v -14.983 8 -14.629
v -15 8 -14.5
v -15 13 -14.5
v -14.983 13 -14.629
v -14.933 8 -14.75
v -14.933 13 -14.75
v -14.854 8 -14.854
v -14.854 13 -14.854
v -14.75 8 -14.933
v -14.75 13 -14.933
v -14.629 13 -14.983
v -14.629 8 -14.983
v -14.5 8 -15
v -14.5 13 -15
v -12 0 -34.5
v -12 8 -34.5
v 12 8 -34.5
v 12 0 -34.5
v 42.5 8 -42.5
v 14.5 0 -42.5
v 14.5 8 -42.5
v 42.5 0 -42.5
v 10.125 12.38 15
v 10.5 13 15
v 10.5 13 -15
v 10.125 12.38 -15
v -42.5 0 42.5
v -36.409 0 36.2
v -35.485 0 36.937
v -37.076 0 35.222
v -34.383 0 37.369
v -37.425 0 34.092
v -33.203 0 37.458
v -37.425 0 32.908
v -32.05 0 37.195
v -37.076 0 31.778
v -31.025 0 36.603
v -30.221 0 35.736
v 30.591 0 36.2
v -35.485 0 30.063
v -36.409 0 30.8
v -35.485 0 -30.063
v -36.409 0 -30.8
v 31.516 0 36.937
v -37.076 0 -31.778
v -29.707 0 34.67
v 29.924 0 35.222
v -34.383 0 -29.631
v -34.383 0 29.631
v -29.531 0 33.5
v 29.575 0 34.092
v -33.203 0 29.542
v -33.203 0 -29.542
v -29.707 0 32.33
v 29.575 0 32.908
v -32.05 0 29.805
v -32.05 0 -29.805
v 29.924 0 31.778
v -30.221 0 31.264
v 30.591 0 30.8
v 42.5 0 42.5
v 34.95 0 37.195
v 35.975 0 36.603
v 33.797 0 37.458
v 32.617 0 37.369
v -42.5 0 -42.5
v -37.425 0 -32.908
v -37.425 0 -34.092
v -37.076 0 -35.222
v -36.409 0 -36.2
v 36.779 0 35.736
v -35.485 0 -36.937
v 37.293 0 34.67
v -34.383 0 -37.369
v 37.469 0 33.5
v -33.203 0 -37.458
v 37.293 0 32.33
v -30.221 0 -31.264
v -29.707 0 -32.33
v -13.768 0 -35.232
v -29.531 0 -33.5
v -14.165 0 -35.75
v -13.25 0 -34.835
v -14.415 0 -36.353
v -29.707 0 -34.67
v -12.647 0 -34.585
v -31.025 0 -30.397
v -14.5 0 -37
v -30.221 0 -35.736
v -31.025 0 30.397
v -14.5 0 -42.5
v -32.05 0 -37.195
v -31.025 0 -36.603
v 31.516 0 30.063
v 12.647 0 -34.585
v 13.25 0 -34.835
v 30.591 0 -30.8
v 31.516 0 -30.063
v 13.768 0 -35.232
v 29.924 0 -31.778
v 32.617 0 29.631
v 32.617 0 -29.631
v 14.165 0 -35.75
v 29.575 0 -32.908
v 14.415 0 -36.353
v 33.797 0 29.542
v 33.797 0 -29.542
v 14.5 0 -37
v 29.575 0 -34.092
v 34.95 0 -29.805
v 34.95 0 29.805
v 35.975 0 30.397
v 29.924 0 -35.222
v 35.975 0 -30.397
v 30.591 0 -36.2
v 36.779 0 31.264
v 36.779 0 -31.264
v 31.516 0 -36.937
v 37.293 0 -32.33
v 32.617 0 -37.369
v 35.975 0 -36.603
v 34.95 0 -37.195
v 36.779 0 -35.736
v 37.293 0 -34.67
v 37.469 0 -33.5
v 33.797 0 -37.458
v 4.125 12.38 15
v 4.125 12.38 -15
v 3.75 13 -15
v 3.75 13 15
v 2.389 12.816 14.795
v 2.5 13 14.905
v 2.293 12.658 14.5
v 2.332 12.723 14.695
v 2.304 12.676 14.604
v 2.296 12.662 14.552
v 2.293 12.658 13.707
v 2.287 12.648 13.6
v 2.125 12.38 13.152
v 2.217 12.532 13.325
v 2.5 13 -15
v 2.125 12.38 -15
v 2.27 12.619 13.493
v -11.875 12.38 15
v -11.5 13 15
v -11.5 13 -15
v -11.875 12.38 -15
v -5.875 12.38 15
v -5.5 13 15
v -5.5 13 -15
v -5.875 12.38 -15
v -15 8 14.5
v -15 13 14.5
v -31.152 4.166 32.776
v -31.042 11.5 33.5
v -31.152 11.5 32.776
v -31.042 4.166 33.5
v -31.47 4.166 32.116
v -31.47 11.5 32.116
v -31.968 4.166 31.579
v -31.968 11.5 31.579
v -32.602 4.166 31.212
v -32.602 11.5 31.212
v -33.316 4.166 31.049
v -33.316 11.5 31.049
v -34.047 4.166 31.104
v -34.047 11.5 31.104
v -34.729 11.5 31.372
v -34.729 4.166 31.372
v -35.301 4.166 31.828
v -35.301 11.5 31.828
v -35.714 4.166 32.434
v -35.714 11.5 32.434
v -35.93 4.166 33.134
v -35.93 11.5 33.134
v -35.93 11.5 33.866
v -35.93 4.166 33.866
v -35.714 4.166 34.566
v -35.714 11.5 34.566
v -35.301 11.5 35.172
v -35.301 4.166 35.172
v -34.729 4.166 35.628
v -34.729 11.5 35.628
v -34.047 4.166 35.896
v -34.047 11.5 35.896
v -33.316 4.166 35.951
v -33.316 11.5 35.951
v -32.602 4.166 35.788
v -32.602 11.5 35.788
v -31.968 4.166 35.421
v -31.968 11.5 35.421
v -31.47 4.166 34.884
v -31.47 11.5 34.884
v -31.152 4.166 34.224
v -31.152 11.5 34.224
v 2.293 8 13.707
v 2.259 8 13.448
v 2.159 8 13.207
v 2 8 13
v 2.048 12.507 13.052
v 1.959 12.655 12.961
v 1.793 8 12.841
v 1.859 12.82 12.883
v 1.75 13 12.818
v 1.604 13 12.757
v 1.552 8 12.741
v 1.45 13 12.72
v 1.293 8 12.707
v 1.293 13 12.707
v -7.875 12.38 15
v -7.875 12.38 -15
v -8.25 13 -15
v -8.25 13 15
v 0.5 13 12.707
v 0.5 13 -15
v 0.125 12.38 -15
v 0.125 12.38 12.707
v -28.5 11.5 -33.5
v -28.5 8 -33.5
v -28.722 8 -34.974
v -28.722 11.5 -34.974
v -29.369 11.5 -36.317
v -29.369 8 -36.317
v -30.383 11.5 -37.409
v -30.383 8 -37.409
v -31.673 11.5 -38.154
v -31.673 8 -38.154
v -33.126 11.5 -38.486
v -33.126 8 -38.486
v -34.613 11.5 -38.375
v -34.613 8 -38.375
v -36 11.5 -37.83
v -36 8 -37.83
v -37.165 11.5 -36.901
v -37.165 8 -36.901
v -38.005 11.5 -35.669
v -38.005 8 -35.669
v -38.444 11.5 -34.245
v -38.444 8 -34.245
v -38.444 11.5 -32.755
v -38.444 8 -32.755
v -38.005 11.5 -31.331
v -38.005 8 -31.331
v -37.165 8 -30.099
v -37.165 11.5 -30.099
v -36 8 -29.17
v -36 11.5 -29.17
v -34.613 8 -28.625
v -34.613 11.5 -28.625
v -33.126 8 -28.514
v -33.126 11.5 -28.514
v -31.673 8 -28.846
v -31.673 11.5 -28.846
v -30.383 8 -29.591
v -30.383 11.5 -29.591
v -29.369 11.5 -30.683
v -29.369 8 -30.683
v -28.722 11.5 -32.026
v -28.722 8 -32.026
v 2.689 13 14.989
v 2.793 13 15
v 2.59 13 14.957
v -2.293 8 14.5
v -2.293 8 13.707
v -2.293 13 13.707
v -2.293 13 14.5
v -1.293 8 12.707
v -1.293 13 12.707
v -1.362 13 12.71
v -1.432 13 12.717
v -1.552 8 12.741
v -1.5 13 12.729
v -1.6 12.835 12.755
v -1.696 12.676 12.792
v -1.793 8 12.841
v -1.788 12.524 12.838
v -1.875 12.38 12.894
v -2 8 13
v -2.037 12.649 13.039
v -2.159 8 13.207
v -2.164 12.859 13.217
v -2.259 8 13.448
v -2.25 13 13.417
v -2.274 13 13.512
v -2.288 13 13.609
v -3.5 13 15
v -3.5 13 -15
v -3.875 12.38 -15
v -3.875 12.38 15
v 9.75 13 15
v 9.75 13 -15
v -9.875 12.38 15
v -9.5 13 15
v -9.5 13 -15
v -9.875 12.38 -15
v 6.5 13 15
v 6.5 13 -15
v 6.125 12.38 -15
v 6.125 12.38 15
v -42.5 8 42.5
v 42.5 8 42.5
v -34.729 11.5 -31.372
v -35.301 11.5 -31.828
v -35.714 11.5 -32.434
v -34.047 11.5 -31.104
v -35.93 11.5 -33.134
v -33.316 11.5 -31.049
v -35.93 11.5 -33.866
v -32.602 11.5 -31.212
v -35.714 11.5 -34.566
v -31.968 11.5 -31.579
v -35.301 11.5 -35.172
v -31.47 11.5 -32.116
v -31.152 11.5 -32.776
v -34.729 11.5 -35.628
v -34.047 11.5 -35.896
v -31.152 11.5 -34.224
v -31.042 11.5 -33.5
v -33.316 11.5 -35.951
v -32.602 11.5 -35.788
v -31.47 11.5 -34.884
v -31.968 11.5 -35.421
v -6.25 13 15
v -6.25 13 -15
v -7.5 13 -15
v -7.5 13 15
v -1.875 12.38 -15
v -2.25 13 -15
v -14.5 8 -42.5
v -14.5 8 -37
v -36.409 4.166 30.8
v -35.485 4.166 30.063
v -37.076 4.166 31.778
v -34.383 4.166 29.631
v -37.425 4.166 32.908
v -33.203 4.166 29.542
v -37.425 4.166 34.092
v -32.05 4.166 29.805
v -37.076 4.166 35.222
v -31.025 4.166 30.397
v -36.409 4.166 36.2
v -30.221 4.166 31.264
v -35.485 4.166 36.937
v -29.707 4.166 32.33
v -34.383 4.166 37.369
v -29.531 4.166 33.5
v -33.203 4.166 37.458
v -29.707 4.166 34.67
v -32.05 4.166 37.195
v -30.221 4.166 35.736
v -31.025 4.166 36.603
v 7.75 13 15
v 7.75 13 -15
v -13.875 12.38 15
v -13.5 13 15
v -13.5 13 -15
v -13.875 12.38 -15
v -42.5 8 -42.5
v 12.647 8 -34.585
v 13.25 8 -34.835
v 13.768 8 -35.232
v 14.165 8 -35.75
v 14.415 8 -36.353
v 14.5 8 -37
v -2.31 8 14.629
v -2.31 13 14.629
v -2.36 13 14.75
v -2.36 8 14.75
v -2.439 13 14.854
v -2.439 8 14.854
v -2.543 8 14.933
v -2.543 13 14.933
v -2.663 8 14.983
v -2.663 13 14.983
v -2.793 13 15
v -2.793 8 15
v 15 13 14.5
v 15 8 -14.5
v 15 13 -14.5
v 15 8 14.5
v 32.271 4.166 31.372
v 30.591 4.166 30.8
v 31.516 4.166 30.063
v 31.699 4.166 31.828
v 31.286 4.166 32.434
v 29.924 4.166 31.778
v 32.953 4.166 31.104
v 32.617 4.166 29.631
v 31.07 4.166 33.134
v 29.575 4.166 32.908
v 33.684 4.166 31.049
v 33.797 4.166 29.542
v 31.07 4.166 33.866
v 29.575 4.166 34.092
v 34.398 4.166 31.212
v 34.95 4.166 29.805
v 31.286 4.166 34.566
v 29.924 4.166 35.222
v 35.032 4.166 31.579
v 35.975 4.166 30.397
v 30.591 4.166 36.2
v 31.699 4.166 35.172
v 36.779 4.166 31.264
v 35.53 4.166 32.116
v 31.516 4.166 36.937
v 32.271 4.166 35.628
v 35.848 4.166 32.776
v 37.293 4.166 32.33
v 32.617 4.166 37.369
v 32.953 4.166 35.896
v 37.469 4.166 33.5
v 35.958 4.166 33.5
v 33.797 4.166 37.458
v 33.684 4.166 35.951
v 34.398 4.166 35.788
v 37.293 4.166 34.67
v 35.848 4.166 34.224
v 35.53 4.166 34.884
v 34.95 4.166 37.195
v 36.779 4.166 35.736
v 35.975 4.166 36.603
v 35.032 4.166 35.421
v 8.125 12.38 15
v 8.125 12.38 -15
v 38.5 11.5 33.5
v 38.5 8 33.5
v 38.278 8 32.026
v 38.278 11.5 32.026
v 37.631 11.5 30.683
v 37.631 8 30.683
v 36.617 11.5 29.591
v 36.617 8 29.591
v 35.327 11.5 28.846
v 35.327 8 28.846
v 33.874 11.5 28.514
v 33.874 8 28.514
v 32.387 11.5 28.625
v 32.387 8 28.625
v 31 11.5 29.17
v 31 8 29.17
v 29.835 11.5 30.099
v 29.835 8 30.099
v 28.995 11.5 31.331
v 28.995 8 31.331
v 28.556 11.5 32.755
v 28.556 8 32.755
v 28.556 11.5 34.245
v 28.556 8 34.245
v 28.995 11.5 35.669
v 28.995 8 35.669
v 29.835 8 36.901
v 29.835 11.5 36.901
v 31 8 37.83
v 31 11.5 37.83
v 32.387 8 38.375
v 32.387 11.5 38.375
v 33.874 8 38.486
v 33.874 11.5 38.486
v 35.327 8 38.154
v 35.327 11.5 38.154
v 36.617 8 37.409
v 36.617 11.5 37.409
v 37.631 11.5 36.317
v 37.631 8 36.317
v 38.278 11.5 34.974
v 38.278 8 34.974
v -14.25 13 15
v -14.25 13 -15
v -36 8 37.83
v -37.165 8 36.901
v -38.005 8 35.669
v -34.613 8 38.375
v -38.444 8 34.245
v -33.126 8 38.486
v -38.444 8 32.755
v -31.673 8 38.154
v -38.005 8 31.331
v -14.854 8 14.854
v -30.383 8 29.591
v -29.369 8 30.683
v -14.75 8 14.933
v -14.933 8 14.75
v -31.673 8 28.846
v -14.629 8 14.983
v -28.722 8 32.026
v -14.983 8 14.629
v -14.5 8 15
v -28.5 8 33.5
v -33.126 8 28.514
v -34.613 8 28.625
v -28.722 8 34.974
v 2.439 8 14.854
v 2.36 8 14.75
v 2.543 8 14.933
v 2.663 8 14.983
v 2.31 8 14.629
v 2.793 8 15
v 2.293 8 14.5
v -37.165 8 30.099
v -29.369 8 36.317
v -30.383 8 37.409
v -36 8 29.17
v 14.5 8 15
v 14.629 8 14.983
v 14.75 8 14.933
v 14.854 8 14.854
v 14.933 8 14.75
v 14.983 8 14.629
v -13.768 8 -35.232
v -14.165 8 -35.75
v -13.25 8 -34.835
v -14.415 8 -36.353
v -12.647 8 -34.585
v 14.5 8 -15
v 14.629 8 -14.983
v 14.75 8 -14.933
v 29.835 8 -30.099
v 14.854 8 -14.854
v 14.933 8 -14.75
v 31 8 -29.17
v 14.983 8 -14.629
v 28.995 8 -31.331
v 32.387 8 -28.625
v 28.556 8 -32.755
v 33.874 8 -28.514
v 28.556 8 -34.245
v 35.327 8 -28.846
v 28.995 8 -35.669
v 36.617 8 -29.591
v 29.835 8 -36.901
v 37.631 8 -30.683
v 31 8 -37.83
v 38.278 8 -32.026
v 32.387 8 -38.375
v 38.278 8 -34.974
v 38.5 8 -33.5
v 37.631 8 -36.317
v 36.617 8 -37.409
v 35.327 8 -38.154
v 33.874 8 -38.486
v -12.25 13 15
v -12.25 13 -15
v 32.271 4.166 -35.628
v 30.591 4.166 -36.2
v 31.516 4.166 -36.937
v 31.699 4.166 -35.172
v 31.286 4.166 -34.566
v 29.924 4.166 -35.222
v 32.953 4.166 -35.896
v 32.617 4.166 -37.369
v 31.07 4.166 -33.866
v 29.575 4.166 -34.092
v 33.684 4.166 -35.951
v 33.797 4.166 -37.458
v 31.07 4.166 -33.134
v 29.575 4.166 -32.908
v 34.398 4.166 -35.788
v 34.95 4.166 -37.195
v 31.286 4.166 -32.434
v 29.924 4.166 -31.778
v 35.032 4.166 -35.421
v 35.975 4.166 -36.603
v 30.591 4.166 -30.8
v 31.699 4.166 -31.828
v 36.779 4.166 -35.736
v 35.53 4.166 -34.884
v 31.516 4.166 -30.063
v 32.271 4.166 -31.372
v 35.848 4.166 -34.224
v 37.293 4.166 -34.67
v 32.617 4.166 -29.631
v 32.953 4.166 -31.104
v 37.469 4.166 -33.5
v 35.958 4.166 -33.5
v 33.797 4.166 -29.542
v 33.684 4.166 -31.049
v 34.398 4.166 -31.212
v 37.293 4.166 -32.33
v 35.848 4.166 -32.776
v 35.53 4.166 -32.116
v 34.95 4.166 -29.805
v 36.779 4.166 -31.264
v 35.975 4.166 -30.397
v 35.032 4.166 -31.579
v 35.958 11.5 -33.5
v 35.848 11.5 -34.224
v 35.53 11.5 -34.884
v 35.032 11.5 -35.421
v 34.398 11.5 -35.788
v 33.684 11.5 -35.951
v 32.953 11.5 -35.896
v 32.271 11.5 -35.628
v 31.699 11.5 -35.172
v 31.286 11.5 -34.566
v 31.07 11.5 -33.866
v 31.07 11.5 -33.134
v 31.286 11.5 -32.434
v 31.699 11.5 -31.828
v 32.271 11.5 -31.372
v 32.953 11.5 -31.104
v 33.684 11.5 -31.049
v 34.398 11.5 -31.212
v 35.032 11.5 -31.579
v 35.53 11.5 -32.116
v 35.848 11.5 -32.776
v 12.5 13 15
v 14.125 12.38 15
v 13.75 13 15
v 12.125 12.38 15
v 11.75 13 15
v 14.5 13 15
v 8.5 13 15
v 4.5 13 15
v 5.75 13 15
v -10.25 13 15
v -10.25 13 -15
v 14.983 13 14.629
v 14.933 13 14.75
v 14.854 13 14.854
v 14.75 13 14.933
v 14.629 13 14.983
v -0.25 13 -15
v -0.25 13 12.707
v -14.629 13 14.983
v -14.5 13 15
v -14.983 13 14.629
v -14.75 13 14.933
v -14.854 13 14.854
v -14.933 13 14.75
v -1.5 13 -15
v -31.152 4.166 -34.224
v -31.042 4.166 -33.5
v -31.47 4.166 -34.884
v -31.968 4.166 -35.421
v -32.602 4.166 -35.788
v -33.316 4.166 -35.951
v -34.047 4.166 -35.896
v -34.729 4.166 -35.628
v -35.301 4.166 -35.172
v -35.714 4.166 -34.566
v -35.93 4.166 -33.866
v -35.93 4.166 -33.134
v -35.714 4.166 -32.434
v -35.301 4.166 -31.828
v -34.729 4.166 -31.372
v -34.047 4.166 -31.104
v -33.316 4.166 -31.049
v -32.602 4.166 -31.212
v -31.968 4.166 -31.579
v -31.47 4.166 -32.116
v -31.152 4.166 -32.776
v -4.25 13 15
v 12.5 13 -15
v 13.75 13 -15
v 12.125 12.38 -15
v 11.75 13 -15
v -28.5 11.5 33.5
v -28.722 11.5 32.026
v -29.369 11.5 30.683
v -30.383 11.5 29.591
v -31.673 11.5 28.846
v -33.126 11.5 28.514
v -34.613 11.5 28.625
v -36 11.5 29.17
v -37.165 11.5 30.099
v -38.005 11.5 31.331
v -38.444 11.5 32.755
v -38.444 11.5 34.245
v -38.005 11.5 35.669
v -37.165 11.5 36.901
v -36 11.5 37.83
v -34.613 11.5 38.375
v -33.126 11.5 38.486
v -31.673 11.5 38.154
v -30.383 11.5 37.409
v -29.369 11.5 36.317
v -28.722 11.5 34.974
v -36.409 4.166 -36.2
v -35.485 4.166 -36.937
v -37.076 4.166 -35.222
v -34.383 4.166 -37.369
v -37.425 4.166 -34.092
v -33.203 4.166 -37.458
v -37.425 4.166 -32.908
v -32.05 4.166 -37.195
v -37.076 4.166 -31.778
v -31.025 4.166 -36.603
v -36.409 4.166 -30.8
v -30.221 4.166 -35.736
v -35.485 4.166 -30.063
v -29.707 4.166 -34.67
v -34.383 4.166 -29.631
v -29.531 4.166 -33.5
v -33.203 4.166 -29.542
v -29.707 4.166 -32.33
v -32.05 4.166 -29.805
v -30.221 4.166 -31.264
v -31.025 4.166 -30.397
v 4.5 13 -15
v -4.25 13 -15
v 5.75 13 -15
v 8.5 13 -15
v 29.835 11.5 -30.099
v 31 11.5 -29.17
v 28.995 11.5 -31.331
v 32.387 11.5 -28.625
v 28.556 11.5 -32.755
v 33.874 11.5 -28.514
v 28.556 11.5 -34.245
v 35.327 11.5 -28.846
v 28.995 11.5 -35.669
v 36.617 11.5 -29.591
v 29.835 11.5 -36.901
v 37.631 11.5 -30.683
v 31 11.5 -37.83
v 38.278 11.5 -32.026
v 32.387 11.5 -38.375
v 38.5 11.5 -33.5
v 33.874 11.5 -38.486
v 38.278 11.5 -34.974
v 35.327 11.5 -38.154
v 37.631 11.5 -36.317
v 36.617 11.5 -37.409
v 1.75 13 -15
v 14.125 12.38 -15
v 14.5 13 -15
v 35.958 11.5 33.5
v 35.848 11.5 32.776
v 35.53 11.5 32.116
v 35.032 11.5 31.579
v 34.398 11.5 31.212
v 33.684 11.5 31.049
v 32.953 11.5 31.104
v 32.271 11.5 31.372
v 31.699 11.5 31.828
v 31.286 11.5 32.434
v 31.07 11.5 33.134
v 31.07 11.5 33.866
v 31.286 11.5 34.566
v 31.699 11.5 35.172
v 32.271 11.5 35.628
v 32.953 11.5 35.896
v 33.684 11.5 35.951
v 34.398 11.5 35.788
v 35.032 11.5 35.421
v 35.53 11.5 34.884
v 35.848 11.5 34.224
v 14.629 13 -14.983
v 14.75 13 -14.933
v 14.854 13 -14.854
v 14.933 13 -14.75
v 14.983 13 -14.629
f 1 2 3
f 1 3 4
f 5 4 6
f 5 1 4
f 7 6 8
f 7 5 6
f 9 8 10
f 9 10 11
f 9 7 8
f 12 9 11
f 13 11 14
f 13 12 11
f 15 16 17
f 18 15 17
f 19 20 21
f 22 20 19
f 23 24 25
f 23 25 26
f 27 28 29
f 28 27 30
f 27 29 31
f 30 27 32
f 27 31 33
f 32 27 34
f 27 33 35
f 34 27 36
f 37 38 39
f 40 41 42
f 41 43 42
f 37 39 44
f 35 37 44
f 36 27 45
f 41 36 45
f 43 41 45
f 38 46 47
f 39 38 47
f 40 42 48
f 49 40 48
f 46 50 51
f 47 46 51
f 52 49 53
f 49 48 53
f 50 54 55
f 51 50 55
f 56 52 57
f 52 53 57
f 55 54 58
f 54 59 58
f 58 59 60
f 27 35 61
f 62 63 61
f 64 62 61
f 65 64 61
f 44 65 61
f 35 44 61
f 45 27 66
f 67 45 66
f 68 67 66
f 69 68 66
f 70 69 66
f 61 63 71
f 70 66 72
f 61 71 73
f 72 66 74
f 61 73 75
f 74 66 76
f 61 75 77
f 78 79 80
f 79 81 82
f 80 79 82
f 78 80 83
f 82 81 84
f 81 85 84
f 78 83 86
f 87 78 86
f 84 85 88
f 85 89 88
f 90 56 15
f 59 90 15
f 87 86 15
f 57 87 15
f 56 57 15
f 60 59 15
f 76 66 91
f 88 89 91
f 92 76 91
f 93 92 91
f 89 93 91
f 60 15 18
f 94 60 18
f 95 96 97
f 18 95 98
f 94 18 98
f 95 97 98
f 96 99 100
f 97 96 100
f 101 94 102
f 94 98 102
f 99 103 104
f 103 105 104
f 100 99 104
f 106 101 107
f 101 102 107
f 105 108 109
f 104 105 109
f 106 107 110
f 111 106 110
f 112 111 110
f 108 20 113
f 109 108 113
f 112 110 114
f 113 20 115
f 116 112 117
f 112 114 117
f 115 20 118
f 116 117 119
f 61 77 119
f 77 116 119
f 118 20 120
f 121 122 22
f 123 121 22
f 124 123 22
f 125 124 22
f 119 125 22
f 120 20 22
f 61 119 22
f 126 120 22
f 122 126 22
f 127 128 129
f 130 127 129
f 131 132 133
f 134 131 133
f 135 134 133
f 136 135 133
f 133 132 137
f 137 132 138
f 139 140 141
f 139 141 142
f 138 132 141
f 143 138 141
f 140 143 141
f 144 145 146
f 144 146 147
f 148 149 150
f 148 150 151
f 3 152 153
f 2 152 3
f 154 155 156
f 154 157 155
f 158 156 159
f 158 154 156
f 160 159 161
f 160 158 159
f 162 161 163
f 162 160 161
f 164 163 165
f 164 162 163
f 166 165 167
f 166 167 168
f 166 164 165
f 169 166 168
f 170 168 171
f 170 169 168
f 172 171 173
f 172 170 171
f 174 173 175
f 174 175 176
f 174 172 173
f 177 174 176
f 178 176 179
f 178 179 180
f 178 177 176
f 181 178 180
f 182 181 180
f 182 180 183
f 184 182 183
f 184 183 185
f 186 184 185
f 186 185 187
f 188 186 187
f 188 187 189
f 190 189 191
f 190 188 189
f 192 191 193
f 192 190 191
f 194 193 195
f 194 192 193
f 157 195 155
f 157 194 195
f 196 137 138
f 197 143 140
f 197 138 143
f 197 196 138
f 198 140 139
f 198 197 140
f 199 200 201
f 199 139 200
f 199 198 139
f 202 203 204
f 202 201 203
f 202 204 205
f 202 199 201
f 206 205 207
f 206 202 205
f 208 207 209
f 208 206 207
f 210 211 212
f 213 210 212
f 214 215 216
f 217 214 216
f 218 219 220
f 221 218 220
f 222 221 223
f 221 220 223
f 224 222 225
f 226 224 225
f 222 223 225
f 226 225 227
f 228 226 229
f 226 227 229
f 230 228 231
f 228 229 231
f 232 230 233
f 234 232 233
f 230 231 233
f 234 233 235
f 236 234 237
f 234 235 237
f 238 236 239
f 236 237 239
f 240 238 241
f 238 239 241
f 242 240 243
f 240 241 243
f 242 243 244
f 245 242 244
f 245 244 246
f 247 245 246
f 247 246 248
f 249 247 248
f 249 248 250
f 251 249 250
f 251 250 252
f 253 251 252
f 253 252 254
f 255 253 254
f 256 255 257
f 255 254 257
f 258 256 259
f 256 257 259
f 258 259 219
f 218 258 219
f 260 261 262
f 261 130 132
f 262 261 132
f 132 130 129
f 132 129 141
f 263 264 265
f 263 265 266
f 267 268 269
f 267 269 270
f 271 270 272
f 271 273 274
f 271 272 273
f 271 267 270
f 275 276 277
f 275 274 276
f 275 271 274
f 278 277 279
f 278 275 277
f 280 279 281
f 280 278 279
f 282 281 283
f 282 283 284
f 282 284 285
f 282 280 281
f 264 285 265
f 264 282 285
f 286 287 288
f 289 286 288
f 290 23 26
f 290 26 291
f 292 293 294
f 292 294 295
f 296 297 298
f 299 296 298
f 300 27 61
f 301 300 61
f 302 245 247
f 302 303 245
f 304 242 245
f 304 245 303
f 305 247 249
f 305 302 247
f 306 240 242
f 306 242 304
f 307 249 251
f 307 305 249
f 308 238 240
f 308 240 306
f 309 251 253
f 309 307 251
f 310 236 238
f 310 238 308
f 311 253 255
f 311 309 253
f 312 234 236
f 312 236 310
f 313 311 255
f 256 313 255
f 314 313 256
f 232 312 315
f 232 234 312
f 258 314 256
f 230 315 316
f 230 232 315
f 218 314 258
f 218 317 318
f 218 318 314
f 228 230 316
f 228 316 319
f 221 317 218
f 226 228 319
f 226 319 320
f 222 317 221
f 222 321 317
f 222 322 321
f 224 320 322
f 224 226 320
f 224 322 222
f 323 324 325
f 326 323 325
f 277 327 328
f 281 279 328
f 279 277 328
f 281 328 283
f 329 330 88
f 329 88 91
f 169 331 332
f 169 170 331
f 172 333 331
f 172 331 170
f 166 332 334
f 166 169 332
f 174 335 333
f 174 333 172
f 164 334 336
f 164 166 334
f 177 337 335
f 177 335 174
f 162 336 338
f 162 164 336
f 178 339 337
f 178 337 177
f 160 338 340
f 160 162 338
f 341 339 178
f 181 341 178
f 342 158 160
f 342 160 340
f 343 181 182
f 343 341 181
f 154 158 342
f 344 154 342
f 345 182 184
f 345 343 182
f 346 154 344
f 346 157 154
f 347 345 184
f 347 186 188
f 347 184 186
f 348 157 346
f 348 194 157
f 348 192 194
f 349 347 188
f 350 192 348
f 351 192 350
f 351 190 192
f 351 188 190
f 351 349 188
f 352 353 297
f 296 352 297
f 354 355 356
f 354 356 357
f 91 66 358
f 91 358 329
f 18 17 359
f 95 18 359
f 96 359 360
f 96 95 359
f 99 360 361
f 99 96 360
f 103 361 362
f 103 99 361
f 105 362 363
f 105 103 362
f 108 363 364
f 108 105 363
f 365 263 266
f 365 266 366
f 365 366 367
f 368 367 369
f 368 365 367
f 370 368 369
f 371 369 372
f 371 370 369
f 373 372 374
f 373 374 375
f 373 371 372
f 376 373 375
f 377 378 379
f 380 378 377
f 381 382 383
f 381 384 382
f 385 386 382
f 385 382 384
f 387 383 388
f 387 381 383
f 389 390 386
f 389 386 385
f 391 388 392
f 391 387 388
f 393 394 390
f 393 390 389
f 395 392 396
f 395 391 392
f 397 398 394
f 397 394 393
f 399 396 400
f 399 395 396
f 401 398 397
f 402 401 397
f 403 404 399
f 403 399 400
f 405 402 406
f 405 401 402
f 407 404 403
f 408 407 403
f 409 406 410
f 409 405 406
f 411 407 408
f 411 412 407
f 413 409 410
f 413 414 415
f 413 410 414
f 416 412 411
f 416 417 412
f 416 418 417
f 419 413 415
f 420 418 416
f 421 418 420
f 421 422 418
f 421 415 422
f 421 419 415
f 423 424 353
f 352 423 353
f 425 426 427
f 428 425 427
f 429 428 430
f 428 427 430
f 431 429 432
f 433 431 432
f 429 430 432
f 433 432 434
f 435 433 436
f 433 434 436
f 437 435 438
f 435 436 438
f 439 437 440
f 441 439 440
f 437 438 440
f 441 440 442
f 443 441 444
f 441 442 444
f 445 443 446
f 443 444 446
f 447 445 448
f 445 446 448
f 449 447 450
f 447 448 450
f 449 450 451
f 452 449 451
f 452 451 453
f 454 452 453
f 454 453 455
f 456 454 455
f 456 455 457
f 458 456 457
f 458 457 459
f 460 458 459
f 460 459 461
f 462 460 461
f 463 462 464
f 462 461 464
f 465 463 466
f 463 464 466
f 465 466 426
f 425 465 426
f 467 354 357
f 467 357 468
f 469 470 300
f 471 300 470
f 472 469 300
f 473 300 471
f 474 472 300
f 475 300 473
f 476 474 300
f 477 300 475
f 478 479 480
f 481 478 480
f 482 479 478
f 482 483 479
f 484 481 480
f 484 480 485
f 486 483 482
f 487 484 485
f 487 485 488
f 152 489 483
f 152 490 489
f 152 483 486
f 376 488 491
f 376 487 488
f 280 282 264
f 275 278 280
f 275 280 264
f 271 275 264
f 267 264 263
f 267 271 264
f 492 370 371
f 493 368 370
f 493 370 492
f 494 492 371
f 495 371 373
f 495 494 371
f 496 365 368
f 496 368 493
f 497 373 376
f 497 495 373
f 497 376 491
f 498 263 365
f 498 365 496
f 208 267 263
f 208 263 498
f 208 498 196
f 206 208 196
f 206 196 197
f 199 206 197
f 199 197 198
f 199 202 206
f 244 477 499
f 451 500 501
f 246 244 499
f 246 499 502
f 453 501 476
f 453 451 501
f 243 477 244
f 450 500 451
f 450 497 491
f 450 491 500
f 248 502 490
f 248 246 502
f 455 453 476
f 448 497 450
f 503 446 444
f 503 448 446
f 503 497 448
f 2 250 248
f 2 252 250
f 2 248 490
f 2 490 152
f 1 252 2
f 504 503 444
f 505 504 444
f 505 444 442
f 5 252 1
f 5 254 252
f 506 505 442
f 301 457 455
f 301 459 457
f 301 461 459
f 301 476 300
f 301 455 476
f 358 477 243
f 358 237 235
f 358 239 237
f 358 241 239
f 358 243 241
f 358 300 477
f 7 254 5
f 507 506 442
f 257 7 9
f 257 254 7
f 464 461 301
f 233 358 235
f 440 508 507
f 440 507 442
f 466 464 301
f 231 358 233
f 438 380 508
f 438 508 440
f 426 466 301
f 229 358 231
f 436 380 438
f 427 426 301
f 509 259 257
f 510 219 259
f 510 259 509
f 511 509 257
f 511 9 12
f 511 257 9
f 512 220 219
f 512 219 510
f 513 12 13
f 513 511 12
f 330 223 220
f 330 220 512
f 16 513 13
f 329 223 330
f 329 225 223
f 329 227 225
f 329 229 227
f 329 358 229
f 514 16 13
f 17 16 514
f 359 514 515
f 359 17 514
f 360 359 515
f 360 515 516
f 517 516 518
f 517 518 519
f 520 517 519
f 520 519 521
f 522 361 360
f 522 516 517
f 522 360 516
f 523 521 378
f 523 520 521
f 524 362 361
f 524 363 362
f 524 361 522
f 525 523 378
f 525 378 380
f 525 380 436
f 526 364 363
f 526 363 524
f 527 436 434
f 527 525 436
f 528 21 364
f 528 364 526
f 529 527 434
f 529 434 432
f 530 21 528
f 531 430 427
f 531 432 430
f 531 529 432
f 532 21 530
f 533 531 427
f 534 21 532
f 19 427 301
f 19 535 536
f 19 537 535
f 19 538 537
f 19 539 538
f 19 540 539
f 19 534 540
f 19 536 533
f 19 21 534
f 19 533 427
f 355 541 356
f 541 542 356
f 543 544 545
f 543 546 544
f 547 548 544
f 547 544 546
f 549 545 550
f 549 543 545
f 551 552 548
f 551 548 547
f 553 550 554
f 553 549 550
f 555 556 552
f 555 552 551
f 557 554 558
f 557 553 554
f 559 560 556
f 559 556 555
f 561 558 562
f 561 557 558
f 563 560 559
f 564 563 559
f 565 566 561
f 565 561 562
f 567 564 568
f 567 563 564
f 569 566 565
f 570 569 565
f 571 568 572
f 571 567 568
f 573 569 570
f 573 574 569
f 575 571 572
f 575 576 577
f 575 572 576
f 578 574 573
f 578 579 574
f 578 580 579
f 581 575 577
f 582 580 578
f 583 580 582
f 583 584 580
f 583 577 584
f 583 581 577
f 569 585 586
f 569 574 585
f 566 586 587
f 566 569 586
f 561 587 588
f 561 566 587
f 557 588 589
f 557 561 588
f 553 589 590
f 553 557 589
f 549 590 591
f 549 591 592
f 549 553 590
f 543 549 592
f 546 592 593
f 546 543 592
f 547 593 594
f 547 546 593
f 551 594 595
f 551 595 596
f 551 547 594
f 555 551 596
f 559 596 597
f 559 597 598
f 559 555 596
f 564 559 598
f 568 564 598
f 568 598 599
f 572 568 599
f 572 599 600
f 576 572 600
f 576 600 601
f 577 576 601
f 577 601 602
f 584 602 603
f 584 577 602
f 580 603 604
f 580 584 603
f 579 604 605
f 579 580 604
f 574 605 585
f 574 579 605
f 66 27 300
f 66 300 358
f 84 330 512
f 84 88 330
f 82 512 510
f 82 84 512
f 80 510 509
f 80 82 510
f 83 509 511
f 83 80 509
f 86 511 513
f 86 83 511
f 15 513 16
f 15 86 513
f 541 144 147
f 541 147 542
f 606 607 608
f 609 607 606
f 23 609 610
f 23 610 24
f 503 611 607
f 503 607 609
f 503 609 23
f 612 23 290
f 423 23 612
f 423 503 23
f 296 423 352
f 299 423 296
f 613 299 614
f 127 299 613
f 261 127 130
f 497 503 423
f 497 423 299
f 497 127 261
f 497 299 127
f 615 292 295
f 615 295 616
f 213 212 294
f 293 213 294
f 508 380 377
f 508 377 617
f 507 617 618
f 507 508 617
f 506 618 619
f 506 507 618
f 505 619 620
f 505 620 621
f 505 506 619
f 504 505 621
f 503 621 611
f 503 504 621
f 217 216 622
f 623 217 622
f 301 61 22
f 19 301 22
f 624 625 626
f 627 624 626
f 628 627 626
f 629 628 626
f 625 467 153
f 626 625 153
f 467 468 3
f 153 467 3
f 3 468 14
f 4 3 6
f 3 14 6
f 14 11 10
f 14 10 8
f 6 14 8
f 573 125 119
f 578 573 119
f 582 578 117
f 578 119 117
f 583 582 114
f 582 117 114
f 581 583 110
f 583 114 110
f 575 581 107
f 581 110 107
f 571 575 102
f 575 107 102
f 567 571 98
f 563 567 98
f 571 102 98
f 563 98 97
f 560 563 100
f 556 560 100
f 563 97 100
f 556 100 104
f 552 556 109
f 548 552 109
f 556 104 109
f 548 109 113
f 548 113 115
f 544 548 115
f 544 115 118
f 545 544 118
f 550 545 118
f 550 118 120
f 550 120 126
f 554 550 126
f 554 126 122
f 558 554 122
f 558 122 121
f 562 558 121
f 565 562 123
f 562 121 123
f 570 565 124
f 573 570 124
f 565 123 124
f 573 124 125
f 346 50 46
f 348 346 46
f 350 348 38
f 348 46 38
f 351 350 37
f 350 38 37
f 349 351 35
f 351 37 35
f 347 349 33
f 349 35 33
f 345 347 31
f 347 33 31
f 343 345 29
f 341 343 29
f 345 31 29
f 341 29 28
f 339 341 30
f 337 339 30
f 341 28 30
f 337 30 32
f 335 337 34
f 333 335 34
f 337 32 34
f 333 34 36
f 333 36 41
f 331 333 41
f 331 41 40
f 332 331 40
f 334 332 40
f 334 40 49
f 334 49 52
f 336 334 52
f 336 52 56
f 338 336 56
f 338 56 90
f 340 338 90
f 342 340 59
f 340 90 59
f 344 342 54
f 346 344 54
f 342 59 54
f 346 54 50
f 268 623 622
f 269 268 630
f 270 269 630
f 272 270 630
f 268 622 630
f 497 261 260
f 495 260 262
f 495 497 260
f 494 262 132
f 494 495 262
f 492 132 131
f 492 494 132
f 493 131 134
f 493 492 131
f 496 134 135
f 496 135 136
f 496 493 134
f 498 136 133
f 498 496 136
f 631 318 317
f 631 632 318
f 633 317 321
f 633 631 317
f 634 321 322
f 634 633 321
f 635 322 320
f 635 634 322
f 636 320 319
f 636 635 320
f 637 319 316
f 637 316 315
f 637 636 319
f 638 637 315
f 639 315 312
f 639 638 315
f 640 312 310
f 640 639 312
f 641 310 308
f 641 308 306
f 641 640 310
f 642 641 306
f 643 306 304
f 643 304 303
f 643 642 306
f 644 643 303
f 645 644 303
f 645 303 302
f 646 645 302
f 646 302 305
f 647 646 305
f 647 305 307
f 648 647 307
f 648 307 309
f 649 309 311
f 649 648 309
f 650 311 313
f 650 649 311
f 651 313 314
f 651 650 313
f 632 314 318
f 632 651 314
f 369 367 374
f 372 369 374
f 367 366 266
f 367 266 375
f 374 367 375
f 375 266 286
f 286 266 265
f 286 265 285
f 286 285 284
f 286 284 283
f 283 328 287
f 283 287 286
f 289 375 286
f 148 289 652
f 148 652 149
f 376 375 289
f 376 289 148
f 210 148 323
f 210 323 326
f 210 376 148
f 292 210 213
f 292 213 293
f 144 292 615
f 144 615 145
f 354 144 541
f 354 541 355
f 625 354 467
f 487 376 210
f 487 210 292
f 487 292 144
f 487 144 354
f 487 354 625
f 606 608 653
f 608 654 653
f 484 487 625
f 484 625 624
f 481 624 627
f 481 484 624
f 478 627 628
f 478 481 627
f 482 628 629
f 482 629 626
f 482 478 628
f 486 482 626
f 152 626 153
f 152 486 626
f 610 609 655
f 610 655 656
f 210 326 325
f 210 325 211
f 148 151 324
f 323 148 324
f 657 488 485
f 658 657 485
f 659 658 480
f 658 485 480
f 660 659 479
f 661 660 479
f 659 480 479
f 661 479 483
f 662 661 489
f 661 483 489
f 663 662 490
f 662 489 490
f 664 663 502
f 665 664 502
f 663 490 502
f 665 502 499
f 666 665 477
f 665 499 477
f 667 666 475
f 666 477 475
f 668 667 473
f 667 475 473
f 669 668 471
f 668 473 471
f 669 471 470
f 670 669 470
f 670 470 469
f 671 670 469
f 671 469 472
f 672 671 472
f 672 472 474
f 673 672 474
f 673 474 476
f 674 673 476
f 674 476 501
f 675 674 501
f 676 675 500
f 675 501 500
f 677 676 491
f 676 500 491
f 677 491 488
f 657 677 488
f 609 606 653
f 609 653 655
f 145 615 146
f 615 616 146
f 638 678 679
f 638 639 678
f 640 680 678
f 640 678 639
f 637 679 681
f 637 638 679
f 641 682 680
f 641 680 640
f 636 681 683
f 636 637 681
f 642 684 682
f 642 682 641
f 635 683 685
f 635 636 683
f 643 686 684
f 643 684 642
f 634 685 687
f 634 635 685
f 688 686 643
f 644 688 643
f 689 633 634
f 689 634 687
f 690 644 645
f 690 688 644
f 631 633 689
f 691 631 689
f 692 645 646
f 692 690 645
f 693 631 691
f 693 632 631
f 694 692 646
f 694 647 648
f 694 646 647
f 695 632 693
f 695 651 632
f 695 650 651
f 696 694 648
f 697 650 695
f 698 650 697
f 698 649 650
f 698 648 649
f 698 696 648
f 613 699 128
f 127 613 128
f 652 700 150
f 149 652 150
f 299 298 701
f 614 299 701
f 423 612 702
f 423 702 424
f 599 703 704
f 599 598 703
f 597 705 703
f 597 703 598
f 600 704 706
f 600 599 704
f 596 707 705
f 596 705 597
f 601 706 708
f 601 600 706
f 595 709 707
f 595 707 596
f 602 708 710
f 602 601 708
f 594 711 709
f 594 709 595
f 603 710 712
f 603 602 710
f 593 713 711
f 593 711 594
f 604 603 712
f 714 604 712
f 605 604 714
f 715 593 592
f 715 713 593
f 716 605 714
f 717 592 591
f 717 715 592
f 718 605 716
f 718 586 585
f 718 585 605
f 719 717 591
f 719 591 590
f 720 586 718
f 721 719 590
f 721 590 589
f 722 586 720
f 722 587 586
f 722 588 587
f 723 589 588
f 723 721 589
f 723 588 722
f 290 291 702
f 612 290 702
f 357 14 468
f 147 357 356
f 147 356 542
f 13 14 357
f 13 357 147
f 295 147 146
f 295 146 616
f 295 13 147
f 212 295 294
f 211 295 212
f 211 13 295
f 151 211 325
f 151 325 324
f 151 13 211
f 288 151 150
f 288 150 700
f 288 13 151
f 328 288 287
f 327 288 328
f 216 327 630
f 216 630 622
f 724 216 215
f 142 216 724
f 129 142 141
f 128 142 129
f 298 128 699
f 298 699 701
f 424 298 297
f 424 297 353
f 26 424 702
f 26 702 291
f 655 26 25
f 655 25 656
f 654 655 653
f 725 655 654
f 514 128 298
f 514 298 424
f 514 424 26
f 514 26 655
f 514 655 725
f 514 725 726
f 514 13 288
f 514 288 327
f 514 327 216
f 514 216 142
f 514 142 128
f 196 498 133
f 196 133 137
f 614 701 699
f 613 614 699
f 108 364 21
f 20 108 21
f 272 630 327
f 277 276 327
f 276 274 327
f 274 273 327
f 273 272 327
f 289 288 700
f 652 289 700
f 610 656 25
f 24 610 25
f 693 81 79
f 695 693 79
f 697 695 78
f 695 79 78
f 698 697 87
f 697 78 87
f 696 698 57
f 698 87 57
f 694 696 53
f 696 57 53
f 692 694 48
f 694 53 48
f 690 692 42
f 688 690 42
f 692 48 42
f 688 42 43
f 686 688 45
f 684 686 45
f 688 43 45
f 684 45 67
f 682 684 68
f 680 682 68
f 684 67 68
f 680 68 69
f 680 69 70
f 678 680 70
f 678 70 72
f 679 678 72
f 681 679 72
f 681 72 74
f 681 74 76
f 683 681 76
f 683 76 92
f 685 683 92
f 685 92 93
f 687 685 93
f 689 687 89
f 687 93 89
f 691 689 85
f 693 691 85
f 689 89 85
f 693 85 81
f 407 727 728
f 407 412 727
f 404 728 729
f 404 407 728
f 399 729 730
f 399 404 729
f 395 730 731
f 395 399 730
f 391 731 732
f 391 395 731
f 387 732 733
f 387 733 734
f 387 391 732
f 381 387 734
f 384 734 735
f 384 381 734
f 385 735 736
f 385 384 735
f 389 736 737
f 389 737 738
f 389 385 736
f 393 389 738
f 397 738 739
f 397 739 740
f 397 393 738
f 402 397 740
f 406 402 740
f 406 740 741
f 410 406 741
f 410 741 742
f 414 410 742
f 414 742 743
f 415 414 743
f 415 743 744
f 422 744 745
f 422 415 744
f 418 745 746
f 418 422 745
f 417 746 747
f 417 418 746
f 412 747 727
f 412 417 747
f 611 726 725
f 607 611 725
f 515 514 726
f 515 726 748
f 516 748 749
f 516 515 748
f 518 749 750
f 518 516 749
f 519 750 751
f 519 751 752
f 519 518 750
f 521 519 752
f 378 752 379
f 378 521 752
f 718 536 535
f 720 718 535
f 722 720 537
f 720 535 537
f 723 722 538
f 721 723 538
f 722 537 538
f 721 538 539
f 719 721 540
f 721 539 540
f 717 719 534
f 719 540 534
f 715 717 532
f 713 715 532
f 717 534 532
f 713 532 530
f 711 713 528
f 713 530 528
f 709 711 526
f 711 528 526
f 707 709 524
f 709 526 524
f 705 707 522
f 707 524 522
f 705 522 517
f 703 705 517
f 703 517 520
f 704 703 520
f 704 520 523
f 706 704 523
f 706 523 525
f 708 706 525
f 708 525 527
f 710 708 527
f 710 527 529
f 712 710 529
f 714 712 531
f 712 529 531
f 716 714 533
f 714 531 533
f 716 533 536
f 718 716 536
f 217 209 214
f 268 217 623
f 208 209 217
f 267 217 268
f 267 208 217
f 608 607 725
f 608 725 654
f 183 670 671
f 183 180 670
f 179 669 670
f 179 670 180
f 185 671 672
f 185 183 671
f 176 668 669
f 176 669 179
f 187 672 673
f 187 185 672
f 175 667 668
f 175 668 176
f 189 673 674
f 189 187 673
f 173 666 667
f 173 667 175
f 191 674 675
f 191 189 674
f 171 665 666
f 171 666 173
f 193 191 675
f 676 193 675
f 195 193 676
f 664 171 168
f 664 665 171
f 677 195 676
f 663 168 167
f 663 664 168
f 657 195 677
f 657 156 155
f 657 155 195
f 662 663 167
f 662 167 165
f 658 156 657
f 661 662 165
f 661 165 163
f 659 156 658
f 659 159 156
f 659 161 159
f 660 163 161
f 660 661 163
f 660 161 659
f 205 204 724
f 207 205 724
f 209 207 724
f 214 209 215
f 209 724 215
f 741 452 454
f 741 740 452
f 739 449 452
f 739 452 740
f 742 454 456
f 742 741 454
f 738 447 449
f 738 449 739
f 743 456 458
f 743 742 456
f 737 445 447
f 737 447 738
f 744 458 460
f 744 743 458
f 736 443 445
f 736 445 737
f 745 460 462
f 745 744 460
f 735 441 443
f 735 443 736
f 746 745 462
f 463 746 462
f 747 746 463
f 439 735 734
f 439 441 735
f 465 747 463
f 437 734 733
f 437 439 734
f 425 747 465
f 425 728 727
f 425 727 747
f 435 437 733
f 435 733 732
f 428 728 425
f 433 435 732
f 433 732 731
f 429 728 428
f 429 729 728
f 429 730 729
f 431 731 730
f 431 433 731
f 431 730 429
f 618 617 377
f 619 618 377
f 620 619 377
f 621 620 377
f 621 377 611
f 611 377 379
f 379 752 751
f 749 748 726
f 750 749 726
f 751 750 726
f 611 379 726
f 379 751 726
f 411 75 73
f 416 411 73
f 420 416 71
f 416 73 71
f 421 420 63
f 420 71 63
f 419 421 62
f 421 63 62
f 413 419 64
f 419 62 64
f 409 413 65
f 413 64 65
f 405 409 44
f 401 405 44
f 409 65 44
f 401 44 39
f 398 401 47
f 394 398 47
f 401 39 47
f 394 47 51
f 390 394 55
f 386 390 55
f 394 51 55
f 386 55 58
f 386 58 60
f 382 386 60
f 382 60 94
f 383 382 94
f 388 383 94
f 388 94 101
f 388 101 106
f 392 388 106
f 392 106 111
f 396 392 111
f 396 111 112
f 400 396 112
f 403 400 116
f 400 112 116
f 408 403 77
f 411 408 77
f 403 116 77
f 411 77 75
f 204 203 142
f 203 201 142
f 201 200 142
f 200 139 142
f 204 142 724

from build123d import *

# Parameters (mm, degrees)
SKETCH1_W           = 85
SKETCH1_H           = 85
SKETCH1_R           = 2.4575
BOSS_EXTRUDE1_DEPTH = 8
SKETCH2_R           = 3.969
CUT_EXTRUDE1_DEPTH  = 4.166
SKETCH3_R           = 5
SKETCH3_R_2         = 2.4575
BOSS_EXTRUDE2_DEPTH = 3.5
BOSS_EXTRUDE3_DEPTH = 5
SKETCH5_W           = 29
SKETCH5_H           = 8
CUT_EXTRUDE2_DEPTH  = 10
FILLET1_R           = 2.5
CUT_EXTRUDE3_REACH  = 59.5


with BuildPart() as part:
    # Sketch1 → Boss-Extrude1 (new body)
    with BuildSketch(Plane(origin=(0, 0, 0), x_dir=(1, 0, 0), z_dir=(0, 1, 0))):
        Rectangle(SKETCH1_W, SKETCH1_H)
        with Locations((-33.5, 33.5)):
            Circle(SKETCH1_R, mode=Mode.SUBTRACT)
        with Locations((-33.5, -33.5)):
            Circle(SKETCH1_R, mode=Mode.SUBTRACT)
        with Locations((33.5, -33.5)):
            Circle(SKETCH1_R, mode=Mode.SUBTRACT)
        with Locations((33.5, 33.5)):
            Circle(SKETCH1_R, mode=Mode.SUBTRACT)
    extrude(amount=BOSS_EXTRUDE1_DEPTH)

    # Sketch2 → Cut-Extrude1 (cut)
    with BuildSketch(Plane.XZ):
        with Locations((-33.5, 33.5)):
            Circle(SKETCH2_R)
        with Locations((33.5, 33.5)):
            Circle(SKETCH2_R)
        with Locations((33.5, -33.5)):
            Circle(SKETCH2_R)
        with Locations((-33.5, -33.5)):
            Circle(SKETCH2_R)
    extrude(amount=-CUT_EXTRUDE1_DEPTH, mode=Mode.SUBTRACT)

    # Sketch3 → Boss-Extrude2 (add)
    with BuildSketch(Plane(origin=(0, 8, 0), x_dir=(1, 0, 0), z_dir=(0, 1, 0))):
        with Locations((33.5, -33.5)):
            Circle(SKETCH3_R)
        with Locations((33.5, -33.5)):
            Circle(SKETCH3_R_2, mode=Mode.SUBTRACT)
        with Locations((-33.5, -33.5)):
            Circle(SKETCH3_R)
        with Locations((-33.5, -33.5)):
            Circle(SKETCH3_R_2, mode=Mode.SUBTRACT)
        with Locations((-33.5, 33.5)):
            Circle(SKETCH3_R)
        with Locations((-33.5, 33.5)):
            Circle(SKETCH3_R_2, mode=Mode.SUBTRACT)
        with Locations((33.5, 33.5)):
            Circle(SKETCH3_R)
        with Locations((33.5, 33.5)):
            Circle(SKETCH3_R_2, mode=Mode.SUBTRACT)
    extrude(amount=BOSS_EXTRUDE2_DEPTH)

    # Sketch4 → Boss-Extrude3 (add)
    with BuildSketch(Plane(origin=(0, 8, 0), x_dir=(1, 0, 0), z_dir=(0, 1, 0))):
        with BuildLine():
            Line((2.2929, -14.5), (2.2929, -13.7071))
            ThreePointArc((2.2929, -13.7071), (2.000006781, -12.999993219), (1.2929, -12.7071))
            Line((1.2929, -12.7071), (-1.2929, -12.7071))
            ThreePointArc((-1.2929, -12.7071), (-2.000006781, -12.999993219), (-2.2929, -13.7071))
            Line((-2.2929, -13.7071), (-2.2929, -14.5))
            ThreePointArc((-2.2929, -14.5), (-2.439346609, -14.853553391), (-2.7929, -15))
            Line((-2.7929, -15), (-14.5, -15))
            ThreePointArc((-14.5, -15), (-14.853553391, -14.853553391), (-15, -14.5))
            Line((-15, -14.5), (-15, 14.5))
            ThreePointArc((-15, 14.5), (-14.853553391, 14.853553391), (-14.5, 15))
            Line((-14.5, 15), (14.5, 15))
            ThreePointArc((14.5, 15), (14.853553391, 14.853553391), (15, 14.5))
            Line((15, 14.5), (15, -14.5))
            ThreePointArc((15, -14.5), (14.853553391, -14.853553391), (14.5, -15))
            Line((14.5, -15), (2.7929, -15))
            ThreePointArc((2.7929, -15), (2.439346609, -14.853553391), (2.2929, -14.5))
        make_face()
    extrude(amount=BOSS_EXTRUDE3_DEPTH)

    # Sketch5 → Cut-Extrude2 (cut)
    with BuildSketch(Plane(origin=(0, 8, 0), x_dir=(1, 0, 0), z_dir=(0, 1, 0))):
        with Locations((0, 38.5)):
            Rectangle(SKETCH5_W, SKETCH5_H)
    extrude(amount=-CUT_EXTRUDE2_DEPTH, mode=Mode.SUBTRACT)

    # Fillet1
    fillet1_edges = [part.edges().sort_by_distance(p)[0] for p in [
        (14.5, 4, -34.5),
        (-14.5, 4, -34.5),
    ]]
    fillet(fillet1_edges, radius=FILLET1_R)

    # Sketch7 → Cut-Extrude3 (cut, up to next)
    with BuildSketch(Plane(origin=(0, 0, -15), x_dir=(-1, 0, 0), z_dir=(0, 0, -1)), mode=Mode.PRIVATE) as cut_extrude3_sk1:
        Polygon((-14.5, 13), (-14.125, 12.38), (-13.75, 13), align=None)
    cut_extrude3_tool1 = extrude(cut_extrude3_sk1.sketch, amount=-CUT_EXTRUDE3_REACH, mode=Mode.PRIVATE) & part.part
    add(cut_extrude3_tool1.solids().sort_by_distance((14.125, 12.793333, -15))[0], mode=Mode.SUBTRACT)
    # Sketch7 → Cut-Extrude3 (cut, up to next)
    with BuildSketch(Plane(origin=(0, 0, -15), x_dir=(-1, 0, 0), z_dir=(0, 0, -1)), mode=Mode.PRIVATE) as cut_extrude3_sk2:
        Polygon((-12.5, 13), (-12.125, 12.38), (-11.75, 13), align=None)
    cut_extrude3_tool2 = extrude(cut_extrude3_sk2.sketch, amount=-CUT_EXTRUDE3_REACH, mode=Mode.PRIVATE) & part.part
    add(cut_extrude3_tool2.solids().sort_by_distance((12.125, 12.793333, -15))[0], mode=Mode.SUBTRACT)
    # Sketch7 → Cut-Extrude3 (cut, up to next)
    with BuildSketch(Plane(origin=(0, 0, -15), x_dir=(-1, 0, 0), z_dir=(0, 0, -1)), mode=Mode.PRIVATE) as cut_extrude3_sk3:
        Polygon((-10.5, 13), (-10.125, 12.38), (-9.75, 13), align=None)
    cut_extrude3_tool3 = extrude(cut_extrude3_sk3.sketch, amount=-CUT_EXTRUDE3_REACH, mode=Mode.PRIVATE) & part.part
    add(cut_extrude3_tool3.solids().sort_by_distance((10.125, 12.793333, -15))[0], mode=Mode.SUBTRACT)
    # Sketch7 → Cut-Extrude3 (cut, up to next)
    with BuildSketch(Plane(origin=(0, 0, -15), x_dir=(-1, 0, 0), z_dir=(0, 0, -1)), mode=Mode.PRIVATE) as cut_extrude3_sk4:
        Polygon((-8.5, 13), (-8.125, 12.38), (-7.75, 13), align=None)
    cut_extrude3_tool4 = extrude(cut_extrude3_sk4.sketch, amount=-CUT_EXTRUDE3_REACH, mode=Mode.PRIVATE) & part.part
    add(cut_extrude3_tool4.solids().sort_by_distance((8.125, 12.793333, -15))[0], mode=Mode.SUBTRACT)
    # Sketch7 → Cut-Extrude3 (cut, up to next)
    with BuildSketch(Plane(origin=(0, 0, -15), x_dir=(-1, 0, 0), z_dir=(0, 0, -1)), mode=Mode.PRIVATE) as cut_extrude3_sk5:
        Polygon((-6.5, 13), (-6.125, 12.38), (-5.75, 13), align=None)
    cut_extrude3_tool5 = extrude(cut_extrude3_sk5.sketch, amount=-CUT_EXTRUDE3_REACH, mode=Mode.PRIVATE) & part.part
    add(cut_extrude3_tool5.solids().sort_by_distance((6.125, 12.793333, -15))[0], mode=Mode.SUBTRACT)
    # Sketch7 → Cut-Extrude3 (cut, up to next)
    with BuildSketch(Plane(origin=(0, 0, -15), x_dir=(-1, 0, 0), z_dir=(0, 0, -1)), mode=Mode.PRIVATE) as cut_extrude3_sk6:
        Polygon((-4.5, 13), (-4.125, 12.38), (-3.75, 13), align=None)
    cut_extrude3_tool6 = extrude(cut_extrude3_sk6.sketch, amount=-CUT_EXTRUDE3_REACH, mode=Mode.PRIVATE) & part.part
    add(cut_extrude3_tool6.solids().sort_by_distance((4.125, 12.793333, -15))[0], mode=Mode.SUBTRACT)
    # Sketch7 → Cut-Extrude3 (cut, up to next)
    with BuildSketch(Plane(origin=(0, 0, -15), x_dir=(-1, 0, 0), z_dir=(0, 0, -1)), mode=Mode.PRIVATE) as cut_extrude3_sk7:
        Polygon((-2.5, 13), (-2.125, 12.38), (-1.75, 13), align=None)
    cut_extrude3_tool7 = extrude(cut_extrude3_sk7.sketch, amount=-CUT_EXTRUDE3_REACH, mode=Mode.PRIVATE) & part.part
    add(cut_extrude3_tool7.solids().sort_by_distance((2.125, 12.793333, -15))[0], mode=Mode.SUBTRACT)
    # Sketch7 → Cut-Extrude3 (cut, up to next)
    with BuildSketch(Plane(origin=(0, 0, -15), x_dir=(-1, 0, 0), z_dir=(0, 0, -1)), mode=Mode.PRIVATE) as cut_extrude3_sk8:
        Polygon((-0.5, 13), (-0.125, 12.38), (0.25, 13), align=None)
    cut_extrude3_tool8 = extrude(cut_extrude3_sk8.sketch, amount=-CUT_EXTRUDE3_REACH, mode=Mode.PRIVATE) & part.part
    add(cut_extrude3_tool8.solids().sort_by_distance((0.125, 12.793333, -15))[0], mode=Mode.SUBTRACT)
    # Sketch7 → Cut-Extrude3 (cut, up to next)
    with BuildSketch(Plane(origin=(0, 0, -15), x_dir=(-1, 0, 0), z_dir=(0, 0, -1)), mode=Mode.PRIVATE) as cut_extrude3_sk9:
        Polygon((1.5, 13), (1.875, 12.38), (2.25, 13), align=None)
    cut_extrude3_tool9 = extrude(cut_extrude3_sk9.sketch, amount=-CUT_EXTRUDE3_REACH, mode=Mode.PRIVATE) & part.part
    add(cut_extrude3_tool9.solids().sort_by_distance((-1.875, 12.793333, -15))[0], mode=Mode.SUBTRACT)
    # Sketch7 → Cut-Extrude3 (cut, up to next)
    with BuildSketch(Plane(origin=(0, 0, -15), x_dir=(-1, 0, 0), z_dir=(0, 0, -1)), mode=Mode.PRIVATE) as cut_extrude3_sk10:
        Polygon((3.5, 13), (3.875, 12.38), (4.25, 13), align=None)
    cut_extrude3_tool10 = extrude(cut_extrude3_sk10.sketch, amount=-CUT_EXTRUDE3_REACH, mode=Mode.PRIVATE) & part.part
    add(cut_extrude3_tool10.solids().sort_by_distance((-3.875, 12.793333, -15))[0], mode=Mode.SUBTRACT)
    # Sketch7 → Cut-Extrude3 (cut, up to next)
    with BuildSketch(Plane(origin=(0, 0, -15), x_dir=(-1, 0, 0), z_dir=(0, 0, -1)), mode=Mode.PRIVATE) as cut_extrude3_sk11:
        Polygon((5.5, 13), (5.875, 12.38), (6.25, 13), align=None)
    cut_extrude3_tool11 = extrude(cut_extrude3_sk11.sketch, amount=-CUT_EXTRUDE3_REACH, mode=Mode.PRIVATE) & part.part
    add(cut_extrude3_tool11.solids().sort_by_distance((-5.875, 12.793333, -15))[0], mode=Mode.SUBTRACT)
    # Sketch7 → Cut-Extrude3 (cut, up to next)
    with BuildSketch(Plane(origin=(0, 0, -15), x_dir=(-1, 0, 0), z_dir=(0, 0, -1)), mode=Mode.PRIVATE) as cut_extrude3_sk12:
        Polygon((7.5, 13), (7.875, 12.38), (8.25, 13), align=None)
    cut_extrude3_tool12 = extrude(cut_extrude3_sk12.sketch, amount=-CUT_EXTRUDE3_REACH, mode=Mode.PRIVATE) & part.part
    add(cut_extrude3_tool12.solids().sort_by_distance((-7.875, 12.793333, -15))[0], mode=Mode.SUBTRACT)
    # Sketch7 → Cut-Extrude3 (cut, up to next)
    with BuildSketch(Plane(origin=(0, 0, -15), x_dir=(-1, 0, 0), z_dir=(0, 0, -1)), mode=Mode.PRIVATE) as cut_extrude3_sk13:
        Polygon((9.5, 13), (9.875, 12.38), (10.25, 13), align=None)
    cut_extrude3_tool13 = extrude(cut_extrude3_sk13.sketch, amount=-CUT_EXTRUDE3_REACH, mode=Mode.PRIVATE) & part.part
    add(cut_extrude3_tool13.solids().sort_by_distance((-9.875, 12.793333, -15))[0], mode=Mode.SUBTRACT)
    # Sketch7 → Cut-Extrude3 (cut, up to next)
    with BuildSketch(Plane(origin=(0, 0, -15), x_dir=(-1, 0, 0), z_dir=(0, 0, -1)), mode=Mode.PRIVATE) as cut_extrude3_sk14:
        Polygon((11.5, 13), (11.875, 12.38), (12.25, 13), align=None)
    cut_extrude3_tool14 = extrude(cut_extrude3_sk14.sketch, amount=-CUT_EXTRUDE3_REACH, mode=Mode.PRIVATE) & part.part
    add(cut_extrude3_tool14.solids().sort_by_distance((-11.875, 12.793333, -15))[0], mode=Mode.SUBTRACT)
    # Sketch7 → Cut-Extrude3 (cut, up to next)
    with BuildSketch(Plane(origin=(0, 0, -15), x_dir=(-1, 0, 0), z_dir=(0, 0, -1)), mode=Mode.PRIVATE) as cut_extrude3_sk15:
        Polygon((13.5, 13), (13.875, 12.38), (14.25, 13), align=None)
    cut_extrude3_tool15 = extrude(cut_extrude3_sk15.sketch, amount=-CUT_EXTRUDE3_REACH, mode=Mode.PRIVATE) & part.part
    add(cut_extrude3_tool15.solids().sort_by_distance((-13.875, 12.793333, -15))[0], mode=Mode.SUBTRACT)


solid = part.part
